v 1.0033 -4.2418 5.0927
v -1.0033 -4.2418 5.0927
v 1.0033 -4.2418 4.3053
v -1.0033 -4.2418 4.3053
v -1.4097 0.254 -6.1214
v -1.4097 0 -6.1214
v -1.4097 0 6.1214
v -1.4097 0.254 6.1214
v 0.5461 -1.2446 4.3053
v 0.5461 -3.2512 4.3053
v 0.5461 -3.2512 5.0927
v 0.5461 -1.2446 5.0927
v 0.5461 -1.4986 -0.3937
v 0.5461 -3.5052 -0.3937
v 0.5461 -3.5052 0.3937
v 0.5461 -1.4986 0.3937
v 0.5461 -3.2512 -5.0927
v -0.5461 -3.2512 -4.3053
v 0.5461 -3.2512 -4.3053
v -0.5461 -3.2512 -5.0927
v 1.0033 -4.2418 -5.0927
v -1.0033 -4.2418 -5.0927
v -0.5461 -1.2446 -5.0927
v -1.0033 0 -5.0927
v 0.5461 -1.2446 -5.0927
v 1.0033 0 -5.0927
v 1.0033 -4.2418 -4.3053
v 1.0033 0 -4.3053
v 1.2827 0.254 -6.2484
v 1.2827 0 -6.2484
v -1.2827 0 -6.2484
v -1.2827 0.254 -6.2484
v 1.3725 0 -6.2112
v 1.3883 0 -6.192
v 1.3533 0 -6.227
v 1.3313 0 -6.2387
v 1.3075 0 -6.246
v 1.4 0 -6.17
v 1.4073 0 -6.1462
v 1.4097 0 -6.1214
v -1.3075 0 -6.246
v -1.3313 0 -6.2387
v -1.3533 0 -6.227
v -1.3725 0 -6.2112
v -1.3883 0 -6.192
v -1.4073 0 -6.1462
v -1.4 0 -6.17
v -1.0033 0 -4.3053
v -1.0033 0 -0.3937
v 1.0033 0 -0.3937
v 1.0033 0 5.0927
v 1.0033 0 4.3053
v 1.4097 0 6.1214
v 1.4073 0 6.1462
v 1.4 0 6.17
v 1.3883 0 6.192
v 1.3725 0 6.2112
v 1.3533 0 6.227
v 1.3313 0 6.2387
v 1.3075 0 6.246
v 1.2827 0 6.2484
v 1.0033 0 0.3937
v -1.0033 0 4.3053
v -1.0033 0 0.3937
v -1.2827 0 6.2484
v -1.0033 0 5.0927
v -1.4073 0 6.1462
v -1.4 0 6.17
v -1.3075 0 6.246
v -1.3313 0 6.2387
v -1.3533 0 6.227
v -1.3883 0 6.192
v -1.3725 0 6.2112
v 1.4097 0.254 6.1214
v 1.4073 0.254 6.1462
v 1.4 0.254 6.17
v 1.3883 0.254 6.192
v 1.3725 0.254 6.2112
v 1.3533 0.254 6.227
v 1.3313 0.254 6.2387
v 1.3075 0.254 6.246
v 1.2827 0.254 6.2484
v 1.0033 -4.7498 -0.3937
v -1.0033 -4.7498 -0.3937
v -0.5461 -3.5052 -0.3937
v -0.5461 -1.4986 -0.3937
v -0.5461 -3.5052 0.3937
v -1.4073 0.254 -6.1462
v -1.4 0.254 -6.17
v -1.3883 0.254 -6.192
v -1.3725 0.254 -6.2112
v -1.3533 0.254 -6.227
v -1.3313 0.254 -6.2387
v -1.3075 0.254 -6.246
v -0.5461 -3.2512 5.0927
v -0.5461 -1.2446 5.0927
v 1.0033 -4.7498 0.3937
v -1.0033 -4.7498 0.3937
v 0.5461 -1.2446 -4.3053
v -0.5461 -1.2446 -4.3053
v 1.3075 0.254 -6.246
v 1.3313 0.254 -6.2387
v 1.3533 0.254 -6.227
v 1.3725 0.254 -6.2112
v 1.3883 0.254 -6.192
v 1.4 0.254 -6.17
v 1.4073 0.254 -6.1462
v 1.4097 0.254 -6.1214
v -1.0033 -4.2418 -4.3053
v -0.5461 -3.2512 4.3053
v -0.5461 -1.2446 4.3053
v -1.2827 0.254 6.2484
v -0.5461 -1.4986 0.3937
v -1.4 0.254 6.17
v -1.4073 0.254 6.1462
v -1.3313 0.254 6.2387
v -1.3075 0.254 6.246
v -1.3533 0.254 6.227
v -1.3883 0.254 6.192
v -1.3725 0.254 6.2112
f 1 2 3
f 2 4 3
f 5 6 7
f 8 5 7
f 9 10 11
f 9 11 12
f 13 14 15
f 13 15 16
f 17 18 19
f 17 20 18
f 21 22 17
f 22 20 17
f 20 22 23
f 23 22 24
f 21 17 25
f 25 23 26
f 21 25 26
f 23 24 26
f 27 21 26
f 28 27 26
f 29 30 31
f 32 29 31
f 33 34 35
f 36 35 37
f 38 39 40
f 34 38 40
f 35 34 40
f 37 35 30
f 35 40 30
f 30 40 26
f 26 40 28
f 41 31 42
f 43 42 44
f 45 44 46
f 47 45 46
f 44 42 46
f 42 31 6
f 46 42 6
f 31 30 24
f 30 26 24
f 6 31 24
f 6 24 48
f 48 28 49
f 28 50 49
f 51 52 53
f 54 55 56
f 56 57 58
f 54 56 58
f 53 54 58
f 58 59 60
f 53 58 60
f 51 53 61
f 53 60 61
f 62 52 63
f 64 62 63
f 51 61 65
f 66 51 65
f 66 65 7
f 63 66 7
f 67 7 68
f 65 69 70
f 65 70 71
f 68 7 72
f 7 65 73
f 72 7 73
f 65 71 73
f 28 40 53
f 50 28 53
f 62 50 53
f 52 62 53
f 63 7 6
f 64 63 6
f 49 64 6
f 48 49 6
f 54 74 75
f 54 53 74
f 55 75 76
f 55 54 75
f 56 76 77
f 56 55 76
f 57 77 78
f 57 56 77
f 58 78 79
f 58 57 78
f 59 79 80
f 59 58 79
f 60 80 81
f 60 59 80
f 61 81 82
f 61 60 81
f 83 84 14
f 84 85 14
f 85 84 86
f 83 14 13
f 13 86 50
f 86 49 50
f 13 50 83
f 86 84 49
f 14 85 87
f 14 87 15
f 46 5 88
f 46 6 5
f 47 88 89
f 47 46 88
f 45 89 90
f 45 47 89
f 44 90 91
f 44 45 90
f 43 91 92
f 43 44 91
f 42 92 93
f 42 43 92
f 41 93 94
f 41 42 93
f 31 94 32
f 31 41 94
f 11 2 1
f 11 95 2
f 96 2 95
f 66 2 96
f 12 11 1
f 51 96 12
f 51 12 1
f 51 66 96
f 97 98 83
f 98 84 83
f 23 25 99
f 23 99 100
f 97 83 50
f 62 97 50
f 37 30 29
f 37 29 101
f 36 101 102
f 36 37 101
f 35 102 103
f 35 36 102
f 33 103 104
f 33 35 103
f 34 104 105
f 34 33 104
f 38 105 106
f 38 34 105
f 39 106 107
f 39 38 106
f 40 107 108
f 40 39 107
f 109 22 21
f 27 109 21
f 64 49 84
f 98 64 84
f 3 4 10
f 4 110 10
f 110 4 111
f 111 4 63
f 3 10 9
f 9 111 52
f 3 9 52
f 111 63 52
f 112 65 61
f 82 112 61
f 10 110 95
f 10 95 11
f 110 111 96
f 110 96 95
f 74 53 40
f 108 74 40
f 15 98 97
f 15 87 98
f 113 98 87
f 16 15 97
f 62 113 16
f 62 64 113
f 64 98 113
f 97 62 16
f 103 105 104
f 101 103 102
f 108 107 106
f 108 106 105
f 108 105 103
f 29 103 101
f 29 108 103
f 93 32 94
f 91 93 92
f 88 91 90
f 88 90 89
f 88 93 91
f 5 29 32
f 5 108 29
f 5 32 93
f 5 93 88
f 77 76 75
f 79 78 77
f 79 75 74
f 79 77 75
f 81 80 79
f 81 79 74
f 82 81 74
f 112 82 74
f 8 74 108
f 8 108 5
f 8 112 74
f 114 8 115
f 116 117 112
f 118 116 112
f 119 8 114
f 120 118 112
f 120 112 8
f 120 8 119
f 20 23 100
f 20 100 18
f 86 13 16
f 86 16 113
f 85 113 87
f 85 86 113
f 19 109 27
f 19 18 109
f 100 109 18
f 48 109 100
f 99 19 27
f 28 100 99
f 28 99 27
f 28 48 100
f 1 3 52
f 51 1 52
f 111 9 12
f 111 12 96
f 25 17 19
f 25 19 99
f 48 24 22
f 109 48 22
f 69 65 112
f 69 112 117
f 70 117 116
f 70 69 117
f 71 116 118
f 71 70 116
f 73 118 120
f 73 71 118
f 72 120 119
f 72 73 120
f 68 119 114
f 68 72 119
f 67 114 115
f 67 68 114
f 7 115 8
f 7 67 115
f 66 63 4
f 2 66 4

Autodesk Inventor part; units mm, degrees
sketch "Sketch_1" plane through (0, 0, 0) normal (0, 1, 0) x (-1, 0, 0)
  line L0 (1.4097, -6.1214) -> (1.4097, 6.1214)
  arc A0 (1.4097, 6.1214) -> (1.2827, 6.2484) centre (1.2827, 6.1214) ccw
  line L1 (1.2827, 6.2484) -> (-1.2827, 6.2484)
  arc A1 (-1.2827, 6.2484) -> (-1.4097, 6.1214) centre (-1.2827, 6.1214) ccw
  line L2 (-1.4097, 6.1214) -> (-1.4097, -6.1214)
  arc A2 (-1.4097, -6.1214) -> (-1.2827, -6.2484) centre (-1.2827, -6.1214) ccw
  line L3 (-1.2827, -6.2484) -> (1.2827, -6.2484)
  arc A3 (1.2827, -6.2484) -> (1.4097, -6.1214) centre (1.2827, -6.1214) ccw
extrude "Extrusion1" add sketch "Sketch_1" along normal blind 0.254
sketch "Sketch_2" plane through (0, 0, -4.699) normal (0, 0, 1) x (1, 0, 0)
  line L0 (-1.0033, 0) -> (-1.0033, -4.2418)
  line L1 (-1.0033, -4.2418) -> (1.0033, -4.2418)
  line L2 (1.0033, -4.2418) -> (1.0033, 0)
  line L3 (1.0033, 0) -> (-1.0033, 0)
  line L4 (-0.5461, -1.2446) -> (-0.5461, -3.2512)
  line L5 (-0.5461, -3.2512) -> (0.5461, -3.2512)
  line L6 (0.5461, -3.2512) -> (0.5461, -1.2446)
  line L7 (0.5461, -1.2446) -> (-0.5461, -1.2446)
extrude "Extrusion2" add sketch "Sketch_2" along normal mid plane 0.7874
sketch "Sketch_3" plane through (0, 0, 4.699) normal (0, 0, 1) x (1, 0, 0)
  line L0 (-1.0033, 0) -> (-1.0033, -4.2418)
  line L1 (-1.0033, -4.2418) -> (1.0033, -4.2418)
  line L2 (1.0033, -4.2418) -> (1.0033, 0)
  line L3 (1.0033, 0) -> (-1.0033, 0)
  line L4 (-0.5461, -1.2446) -> (-0.5461, -3.2512)
  line L5 (-0.5461, -3.2512) -> (0.5461, -3.2512)
  line L6 (0.5461, -3.2512) -> (0.5461, -1.2446)
  line L7 (0.5461, -1.2446) -> (-0.5461, -1.2446)
extrude "Extrusion3" add sketch "Sketch_3" along normal mid plane 0.7874
sketch "Sketch_4" plane through (0, 0, 0) normal (0, 0, 1) x (1, 0, 0)
  line L0 (-1.0033, 0) -> (-1.0033, -4.7498)
  line L1 (-1.0033, -4.7498) -> (1.0033, -4.7498)
  line L2 (1.0033, -4.7498) -> (1.0033, 0)
  line L3 (1.0033, 0) -> (-1.0033, 0)
  line L4 (-0.5461, -1.4986) -> (-0.5461, -3.5052)
  line L5 (-0.5461, -3.5052) -> (0.5461, -3.5052)
  line L6 (0.5461, -3.5052) -> (0.5461, -1.4986)
  line L7 (0.5461, -1.4986) -> (-0.5461, -1.4986)
extrude "Extrusion4" add sketch "Sketch_4" along normal mid plane 0.7874
ref_plane "to_body_XY" through (0, 0, 0) normal (0, 1, 0) x (1, 0, 0)
ref_plane "to_body_YZ" through (0, 0, 0) normal (1, 0, 0) x (0, 0, -1)
ref_plane "to_body_ZX" through (0, 0, 0) normal (0, 0, -1) x (0, 1, 0)
properties part number "MB2011W01-terminals"
